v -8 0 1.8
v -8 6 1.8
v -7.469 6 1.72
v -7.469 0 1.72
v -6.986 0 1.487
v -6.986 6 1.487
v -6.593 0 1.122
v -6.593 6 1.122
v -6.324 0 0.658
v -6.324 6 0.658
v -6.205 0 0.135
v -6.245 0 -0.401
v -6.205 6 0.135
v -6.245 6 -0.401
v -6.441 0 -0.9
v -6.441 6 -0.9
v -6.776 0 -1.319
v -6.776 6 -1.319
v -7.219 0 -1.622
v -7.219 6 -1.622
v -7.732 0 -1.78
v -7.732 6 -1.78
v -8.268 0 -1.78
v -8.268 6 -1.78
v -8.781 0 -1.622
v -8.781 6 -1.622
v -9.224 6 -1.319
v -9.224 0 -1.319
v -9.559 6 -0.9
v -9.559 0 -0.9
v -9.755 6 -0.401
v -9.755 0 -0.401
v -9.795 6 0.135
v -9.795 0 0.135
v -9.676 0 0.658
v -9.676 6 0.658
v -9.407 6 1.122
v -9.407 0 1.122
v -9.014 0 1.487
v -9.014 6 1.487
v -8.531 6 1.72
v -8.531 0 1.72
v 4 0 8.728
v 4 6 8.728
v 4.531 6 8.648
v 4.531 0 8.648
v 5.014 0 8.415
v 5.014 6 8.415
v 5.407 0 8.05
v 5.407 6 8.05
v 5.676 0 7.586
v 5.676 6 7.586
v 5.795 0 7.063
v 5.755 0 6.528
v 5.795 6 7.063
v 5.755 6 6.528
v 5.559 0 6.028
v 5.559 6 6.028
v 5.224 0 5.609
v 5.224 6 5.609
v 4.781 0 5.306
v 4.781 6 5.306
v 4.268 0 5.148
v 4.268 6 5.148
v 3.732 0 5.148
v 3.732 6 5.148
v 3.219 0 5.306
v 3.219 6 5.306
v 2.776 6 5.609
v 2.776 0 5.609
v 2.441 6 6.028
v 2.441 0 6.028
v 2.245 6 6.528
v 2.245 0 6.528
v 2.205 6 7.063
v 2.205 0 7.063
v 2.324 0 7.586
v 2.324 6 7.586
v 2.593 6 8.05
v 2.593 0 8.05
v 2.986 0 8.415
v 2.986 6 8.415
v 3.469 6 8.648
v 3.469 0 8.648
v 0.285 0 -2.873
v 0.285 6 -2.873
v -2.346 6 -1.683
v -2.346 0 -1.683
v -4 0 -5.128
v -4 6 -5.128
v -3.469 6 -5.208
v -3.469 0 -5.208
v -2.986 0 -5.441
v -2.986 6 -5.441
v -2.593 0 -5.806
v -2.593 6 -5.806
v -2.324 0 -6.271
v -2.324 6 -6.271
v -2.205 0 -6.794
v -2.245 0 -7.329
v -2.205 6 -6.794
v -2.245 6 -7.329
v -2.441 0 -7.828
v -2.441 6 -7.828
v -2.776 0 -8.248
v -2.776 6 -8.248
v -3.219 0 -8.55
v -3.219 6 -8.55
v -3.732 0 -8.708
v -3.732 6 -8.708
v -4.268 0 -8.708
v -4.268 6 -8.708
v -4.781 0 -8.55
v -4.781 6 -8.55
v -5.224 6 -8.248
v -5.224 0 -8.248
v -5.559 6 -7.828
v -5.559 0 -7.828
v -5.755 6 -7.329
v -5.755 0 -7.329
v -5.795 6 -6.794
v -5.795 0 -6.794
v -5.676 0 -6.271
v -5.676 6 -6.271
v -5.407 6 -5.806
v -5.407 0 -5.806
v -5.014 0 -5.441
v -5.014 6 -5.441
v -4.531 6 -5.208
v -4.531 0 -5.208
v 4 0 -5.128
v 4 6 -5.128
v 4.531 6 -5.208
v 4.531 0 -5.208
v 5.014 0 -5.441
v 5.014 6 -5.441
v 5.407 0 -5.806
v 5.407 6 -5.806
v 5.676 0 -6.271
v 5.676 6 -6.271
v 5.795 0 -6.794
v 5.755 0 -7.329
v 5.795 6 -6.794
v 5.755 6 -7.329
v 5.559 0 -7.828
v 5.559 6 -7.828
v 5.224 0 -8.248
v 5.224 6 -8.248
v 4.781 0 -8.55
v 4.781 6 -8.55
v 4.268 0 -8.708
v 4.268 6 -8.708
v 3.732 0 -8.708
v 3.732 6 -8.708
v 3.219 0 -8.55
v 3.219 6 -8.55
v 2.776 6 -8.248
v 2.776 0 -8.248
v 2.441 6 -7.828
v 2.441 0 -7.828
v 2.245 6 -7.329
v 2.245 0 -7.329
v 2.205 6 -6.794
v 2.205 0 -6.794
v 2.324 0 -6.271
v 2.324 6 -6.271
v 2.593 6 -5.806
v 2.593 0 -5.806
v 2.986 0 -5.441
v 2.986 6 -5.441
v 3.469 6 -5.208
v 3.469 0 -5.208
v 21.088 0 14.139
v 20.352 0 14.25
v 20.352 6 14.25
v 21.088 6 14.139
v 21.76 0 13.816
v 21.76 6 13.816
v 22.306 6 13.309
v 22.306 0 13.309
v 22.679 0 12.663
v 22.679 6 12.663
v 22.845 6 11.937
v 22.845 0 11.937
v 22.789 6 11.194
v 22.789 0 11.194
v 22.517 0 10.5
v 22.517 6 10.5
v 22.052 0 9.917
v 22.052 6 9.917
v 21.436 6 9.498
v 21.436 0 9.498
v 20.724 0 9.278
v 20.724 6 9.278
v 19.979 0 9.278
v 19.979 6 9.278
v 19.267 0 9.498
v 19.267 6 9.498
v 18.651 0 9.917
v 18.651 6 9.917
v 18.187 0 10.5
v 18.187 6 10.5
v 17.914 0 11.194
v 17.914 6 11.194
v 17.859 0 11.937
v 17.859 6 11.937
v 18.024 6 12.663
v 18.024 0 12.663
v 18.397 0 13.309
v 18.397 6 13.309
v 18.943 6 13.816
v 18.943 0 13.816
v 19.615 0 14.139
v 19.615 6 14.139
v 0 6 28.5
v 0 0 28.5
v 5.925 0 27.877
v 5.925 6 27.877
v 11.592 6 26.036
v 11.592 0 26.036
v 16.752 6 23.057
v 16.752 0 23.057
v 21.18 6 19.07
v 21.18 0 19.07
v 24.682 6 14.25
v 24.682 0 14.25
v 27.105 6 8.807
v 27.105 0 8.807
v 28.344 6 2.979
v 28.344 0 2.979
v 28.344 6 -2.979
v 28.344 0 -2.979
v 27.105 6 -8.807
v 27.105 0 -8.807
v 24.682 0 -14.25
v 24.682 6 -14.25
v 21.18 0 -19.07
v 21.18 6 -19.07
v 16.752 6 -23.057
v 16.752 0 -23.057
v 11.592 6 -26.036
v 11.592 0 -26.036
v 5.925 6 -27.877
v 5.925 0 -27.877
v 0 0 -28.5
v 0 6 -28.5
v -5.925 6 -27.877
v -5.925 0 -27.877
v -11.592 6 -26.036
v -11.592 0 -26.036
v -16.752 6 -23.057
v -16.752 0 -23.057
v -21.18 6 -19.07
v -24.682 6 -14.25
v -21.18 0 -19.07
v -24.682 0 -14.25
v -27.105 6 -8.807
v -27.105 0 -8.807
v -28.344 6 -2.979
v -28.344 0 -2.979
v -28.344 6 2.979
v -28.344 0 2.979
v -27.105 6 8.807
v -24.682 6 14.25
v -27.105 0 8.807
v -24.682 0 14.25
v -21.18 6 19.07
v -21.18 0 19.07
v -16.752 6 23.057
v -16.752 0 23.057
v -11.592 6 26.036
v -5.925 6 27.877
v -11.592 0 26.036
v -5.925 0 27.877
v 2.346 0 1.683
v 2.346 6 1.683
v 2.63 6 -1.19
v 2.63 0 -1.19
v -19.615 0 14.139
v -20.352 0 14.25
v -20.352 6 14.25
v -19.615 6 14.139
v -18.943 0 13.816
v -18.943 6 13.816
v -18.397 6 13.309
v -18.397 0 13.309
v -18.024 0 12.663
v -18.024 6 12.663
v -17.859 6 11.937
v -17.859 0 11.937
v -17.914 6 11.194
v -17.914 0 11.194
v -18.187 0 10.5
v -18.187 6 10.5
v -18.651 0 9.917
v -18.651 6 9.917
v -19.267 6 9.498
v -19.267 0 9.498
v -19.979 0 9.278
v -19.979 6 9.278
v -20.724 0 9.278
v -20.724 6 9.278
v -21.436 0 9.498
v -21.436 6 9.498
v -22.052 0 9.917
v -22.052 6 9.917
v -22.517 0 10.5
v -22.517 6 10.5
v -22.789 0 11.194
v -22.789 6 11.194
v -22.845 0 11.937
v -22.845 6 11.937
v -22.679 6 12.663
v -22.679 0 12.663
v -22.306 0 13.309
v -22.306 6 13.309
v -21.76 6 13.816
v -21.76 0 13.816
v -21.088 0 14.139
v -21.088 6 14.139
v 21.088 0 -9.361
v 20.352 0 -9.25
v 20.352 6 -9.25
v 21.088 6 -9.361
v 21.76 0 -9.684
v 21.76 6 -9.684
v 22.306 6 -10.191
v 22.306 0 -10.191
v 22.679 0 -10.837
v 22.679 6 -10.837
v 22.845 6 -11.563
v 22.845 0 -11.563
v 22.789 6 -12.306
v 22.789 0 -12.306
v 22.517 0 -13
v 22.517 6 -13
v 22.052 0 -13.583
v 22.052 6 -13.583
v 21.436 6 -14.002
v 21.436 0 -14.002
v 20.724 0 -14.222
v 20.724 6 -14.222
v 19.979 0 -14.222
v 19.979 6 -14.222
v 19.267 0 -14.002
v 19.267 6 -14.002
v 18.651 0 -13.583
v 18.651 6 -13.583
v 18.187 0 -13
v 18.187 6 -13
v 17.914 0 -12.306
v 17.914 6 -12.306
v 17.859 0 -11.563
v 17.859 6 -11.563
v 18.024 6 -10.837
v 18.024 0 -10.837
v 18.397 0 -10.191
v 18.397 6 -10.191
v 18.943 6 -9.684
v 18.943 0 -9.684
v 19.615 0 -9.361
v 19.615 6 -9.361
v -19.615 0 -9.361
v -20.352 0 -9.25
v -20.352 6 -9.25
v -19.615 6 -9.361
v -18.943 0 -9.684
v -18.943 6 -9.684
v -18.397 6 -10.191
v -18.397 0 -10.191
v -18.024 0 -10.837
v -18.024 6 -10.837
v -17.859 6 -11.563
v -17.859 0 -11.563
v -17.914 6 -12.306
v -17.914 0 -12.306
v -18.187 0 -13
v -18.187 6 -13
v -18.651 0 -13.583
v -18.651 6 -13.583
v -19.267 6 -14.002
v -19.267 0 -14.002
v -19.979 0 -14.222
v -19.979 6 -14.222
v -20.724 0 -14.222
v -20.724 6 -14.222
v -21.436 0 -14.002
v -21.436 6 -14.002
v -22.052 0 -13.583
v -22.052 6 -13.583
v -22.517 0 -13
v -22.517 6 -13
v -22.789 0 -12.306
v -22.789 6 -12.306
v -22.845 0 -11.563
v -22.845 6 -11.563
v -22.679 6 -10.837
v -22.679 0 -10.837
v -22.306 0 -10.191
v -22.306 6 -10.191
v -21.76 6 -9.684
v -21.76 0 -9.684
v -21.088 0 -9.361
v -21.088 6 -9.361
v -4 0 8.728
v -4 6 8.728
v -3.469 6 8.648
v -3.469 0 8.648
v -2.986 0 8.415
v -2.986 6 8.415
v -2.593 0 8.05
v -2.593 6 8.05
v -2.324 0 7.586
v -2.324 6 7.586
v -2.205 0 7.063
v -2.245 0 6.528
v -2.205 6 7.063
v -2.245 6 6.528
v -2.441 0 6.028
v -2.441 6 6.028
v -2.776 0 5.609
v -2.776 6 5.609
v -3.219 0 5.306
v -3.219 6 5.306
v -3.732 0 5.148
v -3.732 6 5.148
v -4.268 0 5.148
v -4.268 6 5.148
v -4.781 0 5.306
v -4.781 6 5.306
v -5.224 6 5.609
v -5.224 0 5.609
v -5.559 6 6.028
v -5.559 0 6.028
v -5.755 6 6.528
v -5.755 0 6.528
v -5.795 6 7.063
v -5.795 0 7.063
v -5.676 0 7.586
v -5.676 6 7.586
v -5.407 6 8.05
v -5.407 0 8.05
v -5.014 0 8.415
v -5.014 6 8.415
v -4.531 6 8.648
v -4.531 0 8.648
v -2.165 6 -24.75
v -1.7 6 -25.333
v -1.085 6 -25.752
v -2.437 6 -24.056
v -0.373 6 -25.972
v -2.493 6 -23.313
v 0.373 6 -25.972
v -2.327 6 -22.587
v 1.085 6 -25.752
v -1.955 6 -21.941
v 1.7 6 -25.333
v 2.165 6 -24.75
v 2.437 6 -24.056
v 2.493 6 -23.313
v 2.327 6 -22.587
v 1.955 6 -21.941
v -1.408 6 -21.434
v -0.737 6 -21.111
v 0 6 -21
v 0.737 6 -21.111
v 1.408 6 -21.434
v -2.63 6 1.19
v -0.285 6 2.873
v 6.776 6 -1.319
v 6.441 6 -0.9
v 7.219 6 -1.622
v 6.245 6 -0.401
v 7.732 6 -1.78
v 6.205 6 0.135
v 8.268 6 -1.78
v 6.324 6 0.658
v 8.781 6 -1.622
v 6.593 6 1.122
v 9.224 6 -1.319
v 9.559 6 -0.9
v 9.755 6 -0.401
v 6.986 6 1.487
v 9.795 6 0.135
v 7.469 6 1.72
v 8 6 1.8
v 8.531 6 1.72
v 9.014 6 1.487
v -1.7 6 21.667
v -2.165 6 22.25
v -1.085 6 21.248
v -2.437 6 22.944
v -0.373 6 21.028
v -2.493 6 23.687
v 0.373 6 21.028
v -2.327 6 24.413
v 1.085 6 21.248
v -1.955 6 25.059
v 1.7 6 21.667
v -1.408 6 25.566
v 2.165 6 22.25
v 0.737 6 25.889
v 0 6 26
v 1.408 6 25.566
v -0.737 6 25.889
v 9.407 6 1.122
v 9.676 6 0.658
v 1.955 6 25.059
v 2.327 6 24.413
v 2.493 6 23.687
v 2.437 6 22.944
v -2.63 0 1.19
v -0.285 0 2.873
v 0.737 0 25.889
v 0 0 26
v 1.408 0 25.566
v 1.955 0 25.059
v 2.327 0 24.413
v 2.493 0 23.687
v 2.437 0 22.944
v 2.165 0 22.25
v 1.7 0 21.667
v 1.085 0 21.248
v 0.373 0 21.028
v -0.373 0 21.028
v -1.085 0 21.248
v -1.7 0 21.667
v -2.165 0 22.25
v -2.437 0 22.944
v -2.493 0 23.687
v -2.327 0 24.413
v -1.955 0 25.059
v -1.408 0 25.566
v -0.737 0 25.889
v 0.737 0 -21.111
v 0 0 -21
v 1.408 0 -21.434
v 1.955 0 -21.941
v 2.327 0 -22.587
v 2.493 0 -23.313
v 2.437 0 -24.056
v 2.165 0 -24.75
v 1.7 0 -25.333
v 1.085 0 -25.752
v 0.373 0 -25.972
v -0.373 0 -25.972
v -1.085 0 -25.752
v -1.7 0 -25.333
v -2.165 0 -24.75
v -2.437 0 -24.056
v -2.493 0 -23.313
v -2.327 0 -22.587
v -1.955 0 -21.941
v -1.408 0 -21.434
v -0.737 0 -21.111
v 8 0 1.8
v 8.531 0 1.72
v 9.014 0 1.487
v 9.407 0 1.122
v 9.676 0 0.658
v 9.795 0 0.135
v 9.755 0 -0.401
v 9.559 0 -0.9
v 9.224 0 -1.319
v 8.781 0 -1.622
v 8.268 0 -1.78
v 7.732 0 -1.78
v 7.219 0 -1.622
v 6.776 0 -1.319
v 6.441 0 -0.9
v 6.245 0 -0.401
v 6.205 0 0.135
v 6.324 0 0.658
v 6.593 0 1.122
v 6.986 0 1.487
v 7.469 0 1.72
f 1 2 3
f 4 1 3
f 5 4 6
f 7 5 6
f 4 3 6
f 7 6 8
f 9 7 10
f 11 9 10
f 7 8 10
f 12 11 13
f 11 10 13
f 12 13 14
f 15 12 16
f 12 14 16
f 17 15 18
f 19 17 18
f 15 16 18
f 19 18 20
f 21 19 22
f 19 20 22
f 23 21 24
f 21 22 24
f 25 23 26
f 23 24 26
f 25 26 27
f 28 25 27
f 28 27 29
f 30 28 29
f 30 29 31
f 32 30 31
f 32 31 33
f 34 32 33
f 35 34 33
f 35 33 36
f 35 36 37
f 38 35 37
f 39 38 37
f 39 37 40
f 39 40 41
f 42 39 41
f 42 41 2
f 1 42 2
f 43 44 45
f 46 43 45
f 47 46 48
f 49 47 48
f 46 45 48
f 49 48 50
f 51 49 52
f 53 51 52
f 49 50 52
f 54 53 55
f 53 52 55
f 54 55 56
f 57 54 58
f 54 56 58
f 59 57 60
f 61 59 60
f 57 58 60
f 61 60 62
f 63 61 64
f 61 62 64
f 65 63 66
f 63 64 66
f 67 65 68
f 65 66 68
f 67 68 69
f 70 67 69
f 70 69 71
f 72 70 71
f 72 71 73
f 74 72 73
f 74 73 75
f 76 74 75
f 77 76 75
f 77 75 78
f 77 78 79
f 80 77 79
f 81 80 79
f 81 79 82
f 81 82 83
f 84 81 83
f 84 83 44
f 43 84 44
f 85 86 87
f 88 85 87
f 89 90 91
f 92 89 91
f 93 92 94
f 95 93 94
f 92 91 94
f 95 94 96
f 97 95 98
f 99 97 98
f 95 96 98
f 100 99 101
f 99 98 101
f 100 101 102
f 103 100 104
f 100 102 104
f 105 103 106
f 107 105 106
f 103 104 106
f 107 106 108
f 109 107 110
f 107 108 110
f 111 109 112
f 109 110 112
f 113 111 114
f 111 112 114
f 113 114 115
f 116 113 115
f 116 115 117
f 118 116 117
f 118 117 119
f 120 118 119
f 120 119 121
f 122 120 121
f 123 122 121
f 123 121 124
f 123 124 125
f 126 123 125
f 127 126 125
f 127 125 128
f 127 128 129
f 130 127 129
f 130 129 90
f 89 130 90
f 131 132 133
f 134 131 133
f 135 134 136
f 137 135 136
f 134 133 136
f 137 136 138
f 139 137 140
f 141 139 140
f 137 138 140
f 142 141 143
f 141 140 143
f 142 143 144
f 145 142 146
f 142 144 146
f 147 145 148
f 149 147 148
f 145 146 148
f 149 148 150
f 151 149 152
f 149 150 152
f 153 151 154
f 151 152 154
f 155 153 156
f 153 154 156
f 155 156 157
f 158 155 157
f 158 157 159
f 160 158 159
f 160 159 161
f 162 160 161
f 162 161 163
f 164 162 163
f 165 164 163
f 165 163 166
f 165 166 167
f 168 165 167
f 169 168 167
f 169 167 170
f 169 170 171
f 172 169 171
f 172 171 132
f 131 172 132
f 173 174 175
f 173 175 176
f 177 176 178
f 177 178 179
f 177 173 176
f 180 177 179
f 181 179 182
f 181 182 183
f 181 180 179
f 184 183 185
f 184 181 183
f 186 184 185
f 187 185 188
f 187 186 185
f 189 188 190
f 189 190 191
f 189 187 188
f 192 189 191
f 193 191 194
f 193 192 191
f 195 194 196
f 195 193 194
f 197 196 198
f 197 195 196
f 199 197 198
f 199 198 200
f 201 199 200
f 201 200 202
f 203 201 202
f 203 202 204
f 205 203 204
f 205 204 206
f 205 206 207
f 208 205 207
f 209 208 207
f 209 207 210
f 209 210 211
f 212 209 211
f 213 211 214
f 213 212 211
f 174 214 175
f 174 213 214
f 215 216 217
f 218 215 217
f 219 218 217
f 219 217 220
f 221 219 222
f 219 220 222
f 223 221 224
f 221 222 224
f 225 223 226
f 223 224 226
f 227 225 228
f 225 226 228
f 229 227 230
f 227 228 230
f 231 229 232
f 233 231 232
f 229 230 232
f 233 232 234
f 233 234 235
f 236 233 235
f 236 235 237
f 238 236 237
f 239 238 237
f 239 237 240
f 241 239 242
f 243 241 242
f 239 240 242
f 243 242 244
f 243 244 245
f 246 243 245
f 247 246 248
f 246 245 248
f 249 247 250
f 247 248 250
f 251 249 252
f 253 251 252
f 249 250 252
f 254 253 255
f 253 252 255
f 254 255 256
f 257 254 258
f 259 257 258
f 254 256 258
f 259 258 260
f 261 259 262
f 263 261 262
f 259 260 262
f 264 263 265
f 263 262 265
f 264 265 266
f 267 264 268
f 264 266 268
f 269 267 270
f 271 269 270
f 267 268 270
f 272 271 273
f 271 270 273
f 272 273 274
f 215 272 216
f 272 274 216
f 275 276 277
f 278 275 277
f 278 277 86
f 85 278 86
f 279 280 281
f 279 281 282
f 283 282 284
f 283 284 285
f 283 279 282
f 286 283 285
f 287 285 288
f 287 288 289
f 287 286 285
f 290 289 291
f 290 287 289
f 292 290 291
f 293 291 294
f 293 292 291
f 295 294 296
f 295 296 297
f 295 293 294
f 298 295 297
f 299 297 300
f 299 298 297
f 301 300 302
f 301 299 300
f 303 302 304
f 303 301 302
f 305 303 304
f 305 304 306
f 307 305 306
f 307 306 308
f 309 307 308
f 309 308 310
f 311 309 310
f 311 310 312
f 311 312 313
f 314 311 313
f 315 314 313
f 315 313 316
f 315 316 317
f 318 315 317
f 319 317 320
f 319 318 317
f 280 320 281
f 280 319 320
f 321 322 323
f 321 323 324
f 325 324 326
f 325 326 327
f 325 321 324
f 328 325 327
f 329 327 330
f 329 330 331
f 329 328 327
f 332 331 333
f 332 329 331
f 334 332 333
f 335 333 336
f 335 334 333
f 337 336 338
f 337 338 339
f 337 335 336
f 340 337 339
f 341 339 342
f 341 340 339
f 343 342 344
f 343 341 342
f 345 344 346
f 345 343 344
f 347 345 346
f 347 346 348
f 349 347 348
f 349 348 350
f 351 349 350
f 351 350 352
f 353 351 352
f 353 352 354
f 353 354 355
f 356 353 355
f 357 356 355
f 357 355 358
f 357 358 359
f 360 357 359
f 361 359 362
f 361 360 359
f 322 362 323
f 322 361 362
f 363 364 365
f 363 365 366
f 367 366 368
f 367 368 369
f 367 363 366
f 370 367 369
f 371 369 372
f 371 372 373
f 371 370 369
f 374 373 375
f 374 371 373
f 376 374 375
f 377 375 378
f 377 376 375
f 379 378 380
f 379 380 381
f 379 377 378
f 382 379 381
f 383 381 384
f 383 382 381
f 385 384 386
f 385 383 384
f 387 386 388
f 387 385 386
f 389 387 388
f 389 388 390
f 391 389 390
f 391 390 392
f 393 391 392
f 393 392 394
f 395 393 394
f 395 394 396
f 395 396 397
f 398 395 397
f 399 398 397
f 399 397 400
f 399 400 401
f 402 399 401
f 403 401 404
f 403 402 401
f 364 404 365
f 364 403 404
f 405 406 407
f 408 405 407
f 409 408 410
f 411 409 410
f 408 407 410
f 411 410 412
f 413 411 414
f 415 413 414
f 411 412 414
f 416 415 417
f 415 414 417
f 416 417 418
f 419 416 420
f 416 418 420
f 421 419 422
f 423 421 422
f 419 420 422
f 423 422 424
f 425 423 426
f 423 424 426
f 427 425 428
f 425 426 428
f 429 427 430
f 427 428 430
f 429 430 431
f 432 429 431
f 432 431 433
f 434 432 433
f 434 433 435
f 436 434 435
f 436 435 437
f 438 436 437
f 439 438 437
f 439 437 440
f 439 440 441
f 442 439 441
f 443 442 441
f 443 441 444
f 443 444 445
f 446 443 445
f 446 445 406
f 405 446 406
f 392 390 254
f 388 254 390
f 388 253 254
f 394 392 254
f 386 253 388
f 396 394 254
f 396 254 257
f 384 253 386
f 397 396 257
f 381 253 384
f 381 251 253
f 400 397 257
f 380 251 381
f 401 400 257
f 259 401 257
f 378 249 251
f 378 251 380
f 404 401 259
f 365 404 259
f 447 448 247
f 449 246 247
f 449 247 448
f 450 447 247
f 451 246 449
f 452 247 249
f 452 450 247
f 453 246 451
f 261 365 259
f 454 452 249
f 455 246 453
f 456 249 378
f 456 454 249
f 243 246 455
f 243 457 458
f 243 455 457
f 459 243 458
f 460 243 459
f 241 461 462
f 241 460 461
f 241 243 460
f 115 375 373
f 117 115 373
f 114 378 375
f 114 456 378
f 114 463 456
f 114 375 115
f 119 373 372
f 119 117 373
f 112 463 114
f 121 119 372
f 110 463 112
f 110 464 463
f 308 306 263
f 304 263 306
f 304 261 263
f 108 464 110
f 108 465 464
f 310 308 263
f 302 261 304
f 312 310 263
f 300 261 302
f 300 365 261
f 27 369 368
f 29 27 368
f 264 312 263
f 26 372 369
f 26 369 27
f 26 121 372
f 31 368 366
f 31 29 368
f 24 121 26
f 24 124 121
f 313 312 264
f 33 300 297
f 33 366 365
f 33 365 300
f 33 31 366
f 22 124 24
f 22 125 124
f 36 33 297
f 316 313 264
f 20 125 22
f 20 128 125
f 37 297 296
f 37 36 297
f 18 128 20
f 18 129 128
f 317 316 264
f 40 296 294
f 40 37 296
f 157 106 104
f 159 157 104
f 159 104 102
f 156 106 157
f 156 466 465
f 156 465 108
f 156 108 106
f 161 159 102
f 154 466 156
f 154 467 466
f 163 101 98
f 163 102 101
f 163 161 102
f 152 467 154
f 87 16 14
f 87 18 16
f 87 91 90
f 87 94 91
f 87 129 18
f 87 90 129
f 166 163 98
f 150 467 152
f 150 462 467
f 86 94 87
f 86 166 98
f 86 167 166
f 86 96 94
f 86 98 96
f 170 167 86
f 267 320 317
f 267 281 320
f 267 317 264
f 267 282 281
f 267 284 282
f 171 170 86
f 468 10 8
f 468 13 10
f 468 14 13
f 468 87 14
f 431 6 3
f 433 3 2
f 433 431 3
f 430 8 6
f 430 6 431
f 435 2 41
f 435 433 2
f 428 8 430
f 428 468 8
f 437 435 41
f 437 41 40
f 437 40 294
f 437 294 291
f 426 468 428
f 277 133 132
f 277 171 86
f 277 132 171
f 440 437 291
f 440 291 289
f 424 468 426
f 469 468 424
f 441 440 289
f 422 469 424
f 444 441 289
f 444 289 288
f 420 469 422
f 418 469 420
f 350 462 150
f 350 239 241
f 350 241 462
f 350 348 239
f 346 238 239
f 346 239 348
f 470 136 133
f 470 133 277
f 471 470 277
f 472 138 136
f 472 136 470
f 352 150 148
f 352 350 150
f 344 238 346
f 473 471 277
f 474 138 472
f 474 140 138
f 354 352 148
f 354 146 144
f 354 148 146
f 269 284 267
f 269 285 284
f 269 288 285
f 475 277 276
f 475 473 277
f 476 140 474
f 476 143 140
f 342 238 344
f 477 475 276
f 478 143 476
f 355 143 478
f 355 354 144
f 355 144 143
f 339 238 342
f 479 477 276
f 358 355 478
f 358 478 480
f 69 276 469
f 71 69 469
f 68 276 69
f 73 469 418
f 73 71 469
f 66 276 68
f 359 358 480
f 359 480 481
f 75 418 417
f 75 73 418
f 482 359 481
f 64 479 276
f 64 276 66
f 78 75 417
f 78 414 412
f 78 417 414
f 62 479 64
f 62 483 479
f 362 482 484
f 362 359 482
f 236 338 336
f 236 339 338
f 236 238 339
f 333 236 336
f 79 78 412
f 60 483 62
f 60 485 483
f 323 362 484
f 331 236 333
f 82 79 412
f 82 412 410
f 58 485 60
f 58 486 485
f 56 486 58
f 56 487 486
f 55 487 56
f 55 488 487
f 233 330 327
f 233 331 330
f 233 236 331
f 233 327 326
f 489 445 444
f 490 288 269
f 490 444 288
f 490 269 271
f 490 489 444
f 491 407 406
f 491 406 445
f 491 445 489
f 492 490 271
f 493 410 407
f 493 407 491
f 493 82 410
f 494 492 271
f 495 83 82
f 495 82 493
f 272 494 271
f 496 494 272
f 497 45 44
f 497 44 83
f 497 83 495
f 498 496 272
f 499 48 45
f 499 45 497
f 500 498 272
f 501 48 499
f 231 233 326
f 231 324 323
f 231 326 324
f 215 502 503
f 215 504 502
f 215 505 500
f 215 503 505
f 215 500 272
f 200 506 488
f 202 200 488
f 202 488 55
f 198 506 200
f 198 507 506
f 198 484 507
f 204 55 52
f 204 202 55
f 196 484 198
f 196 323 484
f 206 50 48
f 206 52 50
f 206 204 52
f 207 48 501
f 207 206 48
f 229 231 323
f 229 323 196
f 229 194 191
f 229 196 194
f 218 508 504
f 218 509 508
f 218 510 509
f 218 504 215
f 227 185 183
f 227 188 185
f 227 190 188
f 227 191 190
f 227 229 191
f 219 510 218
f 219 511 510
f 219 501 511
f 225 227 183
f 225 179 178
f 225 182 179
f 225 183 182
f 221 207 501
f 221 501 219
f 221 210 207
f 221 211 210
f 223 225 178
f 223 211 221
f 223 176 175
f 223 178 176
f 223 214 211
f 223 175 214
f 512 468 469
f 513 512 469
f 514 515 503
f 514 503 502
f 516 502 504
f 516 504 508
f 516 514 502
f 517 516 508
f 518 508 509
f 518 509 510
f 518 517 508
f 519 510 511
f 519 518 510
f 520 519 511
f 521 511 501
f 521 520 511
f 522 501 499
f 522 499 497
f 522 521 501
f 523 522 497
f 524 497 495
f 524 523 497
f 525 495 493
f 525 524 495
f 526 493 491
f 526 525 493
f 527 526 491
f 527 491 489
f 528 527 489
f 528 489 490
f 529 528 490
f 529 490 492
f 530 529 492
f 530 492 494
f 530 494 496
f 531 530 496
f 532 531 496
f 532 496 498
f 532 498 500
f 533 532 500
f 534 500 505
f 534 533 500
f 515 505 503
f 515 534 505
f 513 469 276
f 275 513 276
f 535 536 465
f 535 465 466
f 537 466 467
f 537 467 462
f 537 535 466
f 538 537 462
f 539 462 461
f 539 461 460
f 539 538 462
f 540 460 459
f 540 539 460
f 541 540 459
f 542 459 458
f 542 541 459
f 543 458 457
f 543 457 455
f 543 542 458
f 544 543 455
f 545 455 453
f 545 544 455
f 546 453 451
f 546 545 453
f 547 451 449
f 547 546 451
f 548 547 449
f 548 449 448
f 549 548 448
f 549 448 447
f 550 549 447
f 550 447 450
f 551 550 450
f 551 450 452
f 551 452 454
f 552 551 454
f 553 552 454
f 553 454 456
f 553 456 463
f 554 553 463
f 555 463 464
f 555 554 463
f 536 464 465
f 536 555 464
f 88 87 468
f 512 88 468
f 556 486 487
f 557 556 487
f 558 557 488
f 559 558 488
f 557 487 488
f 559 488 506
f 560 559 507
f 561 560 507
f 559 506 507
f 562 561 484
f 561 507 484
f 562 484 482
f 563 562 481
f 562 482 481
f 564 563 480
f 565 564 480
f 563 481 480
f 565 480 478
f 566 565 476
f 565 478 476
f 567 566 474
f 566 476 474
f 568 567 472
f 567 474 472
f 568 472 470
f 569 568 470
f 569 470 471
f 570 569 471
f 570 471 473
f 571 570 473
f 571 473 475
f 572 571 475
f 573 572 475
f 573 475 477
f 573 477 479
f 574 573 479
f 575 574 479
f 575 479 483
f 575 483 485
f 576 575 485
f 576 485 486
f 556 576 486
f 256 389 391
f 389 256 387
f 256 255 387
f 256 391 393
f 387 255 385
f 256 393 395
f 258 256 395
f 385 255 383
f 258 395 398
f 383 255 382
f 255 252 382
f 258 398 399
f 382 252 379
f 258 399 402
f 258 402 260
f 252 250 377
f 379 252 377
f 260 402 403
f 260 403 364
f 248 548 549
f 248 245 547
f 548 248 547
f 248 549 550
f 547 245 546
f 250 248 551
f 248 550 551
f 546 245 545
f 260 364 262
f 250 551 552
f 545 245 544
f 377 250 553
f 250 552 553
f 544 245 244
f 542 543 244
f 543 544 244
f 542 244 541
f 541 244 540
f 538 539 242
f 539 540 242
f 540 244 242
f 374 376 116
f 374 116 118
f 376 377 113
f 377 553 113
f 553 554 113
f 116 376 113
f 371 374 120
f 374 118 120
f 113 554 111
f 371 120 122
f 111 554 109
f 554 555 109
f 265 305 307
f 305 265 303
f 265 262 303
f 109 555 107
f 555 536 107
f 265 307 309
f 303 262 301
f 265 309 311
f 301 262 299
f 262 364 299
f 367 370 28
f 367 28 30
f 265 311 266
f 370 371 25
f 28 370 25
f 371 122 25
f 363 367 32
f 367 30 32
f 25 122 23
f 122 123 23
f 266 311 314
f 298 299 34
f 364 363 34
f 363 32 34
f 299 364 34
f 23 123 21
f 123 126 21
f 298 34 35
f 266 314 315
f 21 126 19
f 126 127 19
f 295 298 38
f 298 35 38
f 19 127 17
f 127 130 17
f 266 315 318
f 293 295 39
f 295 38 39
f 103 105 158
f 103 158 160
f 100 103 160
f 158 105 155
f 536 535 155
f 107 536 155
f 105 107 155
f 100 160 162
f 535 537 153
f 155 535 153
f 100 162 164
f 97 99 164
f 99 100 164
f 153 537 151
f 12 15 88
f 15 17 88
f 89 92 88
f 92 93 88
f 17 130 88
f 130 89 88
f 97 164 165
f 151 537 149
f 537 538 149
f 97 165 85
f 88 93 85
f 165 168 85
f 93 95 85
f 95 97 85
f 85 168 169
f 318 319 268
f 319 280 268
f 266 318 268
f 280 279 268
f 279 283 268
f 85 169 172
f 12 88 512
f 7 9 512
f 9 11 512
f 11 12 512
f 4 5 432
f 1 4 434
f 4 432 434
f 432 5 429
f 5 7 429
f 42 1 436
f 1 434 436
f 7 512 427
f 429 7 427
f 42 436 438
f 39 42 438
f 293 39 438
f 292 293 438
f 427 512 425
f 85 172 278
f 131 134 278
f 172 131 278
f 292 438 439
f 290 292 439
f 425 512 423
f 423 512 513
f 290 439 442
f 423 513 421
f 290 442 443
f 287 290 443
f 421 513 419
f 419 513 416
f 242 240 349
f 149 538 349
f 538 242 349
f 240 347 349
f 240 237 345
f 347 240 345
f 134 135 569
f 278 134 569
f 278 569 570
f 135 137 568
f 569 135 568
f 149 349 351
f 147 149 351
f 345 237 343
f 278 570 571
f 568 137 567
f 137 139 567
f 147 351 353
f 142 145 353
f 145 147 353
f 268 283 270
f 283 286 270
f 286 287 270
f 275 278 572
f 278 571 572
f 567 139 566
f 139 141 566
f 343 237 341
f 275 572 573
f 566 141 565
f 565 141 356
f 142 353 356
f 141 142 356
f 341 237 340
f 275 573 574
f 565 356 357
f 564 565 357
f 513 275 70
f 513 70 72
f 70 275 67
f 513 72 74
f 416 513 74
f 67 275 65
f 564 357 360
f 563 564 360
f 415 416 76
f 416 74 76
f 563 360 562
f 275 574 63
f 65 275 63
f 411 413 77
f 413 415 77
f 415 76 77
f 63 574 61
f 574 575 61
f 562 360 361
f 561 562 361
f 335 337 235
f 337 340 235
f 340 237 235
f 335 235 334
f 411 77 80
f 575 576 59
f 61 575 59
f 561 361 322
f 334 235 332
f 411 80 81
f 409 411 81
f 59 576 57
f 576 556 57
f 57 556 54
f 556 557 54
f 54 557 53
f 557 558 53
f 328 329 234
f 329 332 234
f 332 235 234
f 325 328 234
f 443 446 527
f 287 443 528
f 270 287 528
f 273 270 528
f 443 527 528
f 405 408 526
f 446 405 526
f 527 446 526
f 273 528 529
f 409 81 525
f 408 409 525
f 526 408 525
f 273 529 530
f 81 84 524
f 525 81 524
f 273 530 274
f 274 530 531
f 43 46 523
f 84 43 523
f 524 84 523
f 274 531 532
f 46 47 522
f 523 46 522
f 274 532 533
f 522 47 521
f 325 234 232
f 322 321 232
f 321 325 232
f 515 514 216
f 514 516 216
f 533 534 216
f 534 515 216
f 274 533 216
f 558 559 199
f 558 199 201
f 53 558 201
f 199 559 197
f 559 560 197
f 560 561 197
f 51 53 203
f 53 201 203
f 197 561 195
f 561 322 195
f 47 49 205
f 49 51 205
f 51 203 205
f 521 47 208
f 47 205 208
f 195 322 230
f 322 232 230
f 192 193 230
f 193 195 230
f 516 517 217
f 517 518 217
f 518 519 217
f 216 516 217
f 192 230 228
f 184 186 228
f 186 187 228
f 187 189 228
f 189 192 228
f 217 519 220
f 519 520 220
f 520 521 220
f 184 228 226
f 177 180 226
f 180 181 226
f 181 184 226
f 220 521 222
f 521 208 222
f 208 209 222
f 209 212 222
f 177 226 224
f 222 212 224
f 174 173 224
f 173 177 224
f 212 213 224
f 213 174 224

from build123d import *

# Parameters (mm, degrees)
SKETCH1_R           = 28.5
SKETCH1_R_2         = 2.5
BOSS_EXTRUDE1_DEPTH = 6
CUT_EXTRUDE1_DEPTH  = 8
SKETCH3_R           = 1.8
CUT_EXTRUDE2_DEPTH  = 10.54


with BuildPart() as part:
    # Sketch1 → Boss-Extrude1 (new body)
    with BuildSketch(Plane(origin=(0, 0, 0), x_dir=(1, 0, 0), z_dir=(0, 1, 0))):
        with Locations(Location((0, 0, 0), (0, 0, 270))):
            Circle(SKETCH1_R)
        with Locations(Location((0, 23.5, 0), (0, 0, 270))):
            Circle(SKETCH1_R_2, mode=Mode.SUBTRACT)
        with Locations(Location((20.351596989, 11.75, 0), (0, 0, 270))):
            Circle(SKETCH1_R_2, mode=Mode.SUBTRACT)
        with Locations(Location((20.351596989, -11.75, 0), (0, 0, 270))):
            Circle(SKETCH1_R_2, mode=Mode.SUBTRACT)
        with Locations(Location((0, -23.5, 0), (0, 0, 270))):
            Circle(SKETCH1_R_2, mode=Mode.SUBTRACT)
        with Locations(Location((-20.351596989, -11.75, 0), (0, 0, 270))):
            Circle(SKETCH1_R_2, mode=Mode.SUBTRACT)
        with Locations(Location((-20.351596989, 11.75, 0), (0, 0, 270))):
            Circle(SKETCH1_R_2, mode=Mode.SUBTRACT)
    extrude(amount=BOSS_EXTRUDE1_DEPTH)

    # Sketch2 → Cut-Extrude1 (cut)
    with BuildSketch(Plane(origin=(0, 6, 0), x_dir=(1, 0, 0), z_dir=(0, 1, 0))):
        Polygon((-0.284546252, -2.872693294), (2.345552244, -1.68277093), (2.630098496, 1.189922365), (0.284546252, 2.872693294), (-2.345552244, 1.68277093), (-2.630098496, -1.189922365), align=None)
    extrude(amount=-CUT_EXTRUDE1_DEPTH, mode=Mode.SUBTRACT)

    # Sketch3 → Cut-Extrude2 (cut)
    with BuildSketch(Plane(origin=(0, 6, 0), x_dir=(1, 0, 0), z_dir=(0, 1, 0))):
        with Locations(Location((8, 0, 0), (0, 0, 270))):
            Circle(SKETCH3_R)
        with Locations(Location((4, -6.92820323, 0), (0, 0, 270))):
            Circle(SKETCH3_R)
        with Locations(Location((-4, -6.92820323, 0), (0, 0, 270))):
            Circle(SKETCH3_R)
        with Locations(Location((-8, 0, 0), (0, 0, 270))):
            Circle(SKETCH3_R)
        with Locations(Location((-4, 6.92820323, 0), (0, 0, 270))):
            Circle(SKETCH3_R)
        with Locations(Location((4, 6.92820323, 0), (0, 0, 270))):
            Circle(SKETCH3_R)
    extrude(amount=-CUT_EXTRUDE2_DEPTH, mode=Mode.SUBTRACT)


solid = part.part
